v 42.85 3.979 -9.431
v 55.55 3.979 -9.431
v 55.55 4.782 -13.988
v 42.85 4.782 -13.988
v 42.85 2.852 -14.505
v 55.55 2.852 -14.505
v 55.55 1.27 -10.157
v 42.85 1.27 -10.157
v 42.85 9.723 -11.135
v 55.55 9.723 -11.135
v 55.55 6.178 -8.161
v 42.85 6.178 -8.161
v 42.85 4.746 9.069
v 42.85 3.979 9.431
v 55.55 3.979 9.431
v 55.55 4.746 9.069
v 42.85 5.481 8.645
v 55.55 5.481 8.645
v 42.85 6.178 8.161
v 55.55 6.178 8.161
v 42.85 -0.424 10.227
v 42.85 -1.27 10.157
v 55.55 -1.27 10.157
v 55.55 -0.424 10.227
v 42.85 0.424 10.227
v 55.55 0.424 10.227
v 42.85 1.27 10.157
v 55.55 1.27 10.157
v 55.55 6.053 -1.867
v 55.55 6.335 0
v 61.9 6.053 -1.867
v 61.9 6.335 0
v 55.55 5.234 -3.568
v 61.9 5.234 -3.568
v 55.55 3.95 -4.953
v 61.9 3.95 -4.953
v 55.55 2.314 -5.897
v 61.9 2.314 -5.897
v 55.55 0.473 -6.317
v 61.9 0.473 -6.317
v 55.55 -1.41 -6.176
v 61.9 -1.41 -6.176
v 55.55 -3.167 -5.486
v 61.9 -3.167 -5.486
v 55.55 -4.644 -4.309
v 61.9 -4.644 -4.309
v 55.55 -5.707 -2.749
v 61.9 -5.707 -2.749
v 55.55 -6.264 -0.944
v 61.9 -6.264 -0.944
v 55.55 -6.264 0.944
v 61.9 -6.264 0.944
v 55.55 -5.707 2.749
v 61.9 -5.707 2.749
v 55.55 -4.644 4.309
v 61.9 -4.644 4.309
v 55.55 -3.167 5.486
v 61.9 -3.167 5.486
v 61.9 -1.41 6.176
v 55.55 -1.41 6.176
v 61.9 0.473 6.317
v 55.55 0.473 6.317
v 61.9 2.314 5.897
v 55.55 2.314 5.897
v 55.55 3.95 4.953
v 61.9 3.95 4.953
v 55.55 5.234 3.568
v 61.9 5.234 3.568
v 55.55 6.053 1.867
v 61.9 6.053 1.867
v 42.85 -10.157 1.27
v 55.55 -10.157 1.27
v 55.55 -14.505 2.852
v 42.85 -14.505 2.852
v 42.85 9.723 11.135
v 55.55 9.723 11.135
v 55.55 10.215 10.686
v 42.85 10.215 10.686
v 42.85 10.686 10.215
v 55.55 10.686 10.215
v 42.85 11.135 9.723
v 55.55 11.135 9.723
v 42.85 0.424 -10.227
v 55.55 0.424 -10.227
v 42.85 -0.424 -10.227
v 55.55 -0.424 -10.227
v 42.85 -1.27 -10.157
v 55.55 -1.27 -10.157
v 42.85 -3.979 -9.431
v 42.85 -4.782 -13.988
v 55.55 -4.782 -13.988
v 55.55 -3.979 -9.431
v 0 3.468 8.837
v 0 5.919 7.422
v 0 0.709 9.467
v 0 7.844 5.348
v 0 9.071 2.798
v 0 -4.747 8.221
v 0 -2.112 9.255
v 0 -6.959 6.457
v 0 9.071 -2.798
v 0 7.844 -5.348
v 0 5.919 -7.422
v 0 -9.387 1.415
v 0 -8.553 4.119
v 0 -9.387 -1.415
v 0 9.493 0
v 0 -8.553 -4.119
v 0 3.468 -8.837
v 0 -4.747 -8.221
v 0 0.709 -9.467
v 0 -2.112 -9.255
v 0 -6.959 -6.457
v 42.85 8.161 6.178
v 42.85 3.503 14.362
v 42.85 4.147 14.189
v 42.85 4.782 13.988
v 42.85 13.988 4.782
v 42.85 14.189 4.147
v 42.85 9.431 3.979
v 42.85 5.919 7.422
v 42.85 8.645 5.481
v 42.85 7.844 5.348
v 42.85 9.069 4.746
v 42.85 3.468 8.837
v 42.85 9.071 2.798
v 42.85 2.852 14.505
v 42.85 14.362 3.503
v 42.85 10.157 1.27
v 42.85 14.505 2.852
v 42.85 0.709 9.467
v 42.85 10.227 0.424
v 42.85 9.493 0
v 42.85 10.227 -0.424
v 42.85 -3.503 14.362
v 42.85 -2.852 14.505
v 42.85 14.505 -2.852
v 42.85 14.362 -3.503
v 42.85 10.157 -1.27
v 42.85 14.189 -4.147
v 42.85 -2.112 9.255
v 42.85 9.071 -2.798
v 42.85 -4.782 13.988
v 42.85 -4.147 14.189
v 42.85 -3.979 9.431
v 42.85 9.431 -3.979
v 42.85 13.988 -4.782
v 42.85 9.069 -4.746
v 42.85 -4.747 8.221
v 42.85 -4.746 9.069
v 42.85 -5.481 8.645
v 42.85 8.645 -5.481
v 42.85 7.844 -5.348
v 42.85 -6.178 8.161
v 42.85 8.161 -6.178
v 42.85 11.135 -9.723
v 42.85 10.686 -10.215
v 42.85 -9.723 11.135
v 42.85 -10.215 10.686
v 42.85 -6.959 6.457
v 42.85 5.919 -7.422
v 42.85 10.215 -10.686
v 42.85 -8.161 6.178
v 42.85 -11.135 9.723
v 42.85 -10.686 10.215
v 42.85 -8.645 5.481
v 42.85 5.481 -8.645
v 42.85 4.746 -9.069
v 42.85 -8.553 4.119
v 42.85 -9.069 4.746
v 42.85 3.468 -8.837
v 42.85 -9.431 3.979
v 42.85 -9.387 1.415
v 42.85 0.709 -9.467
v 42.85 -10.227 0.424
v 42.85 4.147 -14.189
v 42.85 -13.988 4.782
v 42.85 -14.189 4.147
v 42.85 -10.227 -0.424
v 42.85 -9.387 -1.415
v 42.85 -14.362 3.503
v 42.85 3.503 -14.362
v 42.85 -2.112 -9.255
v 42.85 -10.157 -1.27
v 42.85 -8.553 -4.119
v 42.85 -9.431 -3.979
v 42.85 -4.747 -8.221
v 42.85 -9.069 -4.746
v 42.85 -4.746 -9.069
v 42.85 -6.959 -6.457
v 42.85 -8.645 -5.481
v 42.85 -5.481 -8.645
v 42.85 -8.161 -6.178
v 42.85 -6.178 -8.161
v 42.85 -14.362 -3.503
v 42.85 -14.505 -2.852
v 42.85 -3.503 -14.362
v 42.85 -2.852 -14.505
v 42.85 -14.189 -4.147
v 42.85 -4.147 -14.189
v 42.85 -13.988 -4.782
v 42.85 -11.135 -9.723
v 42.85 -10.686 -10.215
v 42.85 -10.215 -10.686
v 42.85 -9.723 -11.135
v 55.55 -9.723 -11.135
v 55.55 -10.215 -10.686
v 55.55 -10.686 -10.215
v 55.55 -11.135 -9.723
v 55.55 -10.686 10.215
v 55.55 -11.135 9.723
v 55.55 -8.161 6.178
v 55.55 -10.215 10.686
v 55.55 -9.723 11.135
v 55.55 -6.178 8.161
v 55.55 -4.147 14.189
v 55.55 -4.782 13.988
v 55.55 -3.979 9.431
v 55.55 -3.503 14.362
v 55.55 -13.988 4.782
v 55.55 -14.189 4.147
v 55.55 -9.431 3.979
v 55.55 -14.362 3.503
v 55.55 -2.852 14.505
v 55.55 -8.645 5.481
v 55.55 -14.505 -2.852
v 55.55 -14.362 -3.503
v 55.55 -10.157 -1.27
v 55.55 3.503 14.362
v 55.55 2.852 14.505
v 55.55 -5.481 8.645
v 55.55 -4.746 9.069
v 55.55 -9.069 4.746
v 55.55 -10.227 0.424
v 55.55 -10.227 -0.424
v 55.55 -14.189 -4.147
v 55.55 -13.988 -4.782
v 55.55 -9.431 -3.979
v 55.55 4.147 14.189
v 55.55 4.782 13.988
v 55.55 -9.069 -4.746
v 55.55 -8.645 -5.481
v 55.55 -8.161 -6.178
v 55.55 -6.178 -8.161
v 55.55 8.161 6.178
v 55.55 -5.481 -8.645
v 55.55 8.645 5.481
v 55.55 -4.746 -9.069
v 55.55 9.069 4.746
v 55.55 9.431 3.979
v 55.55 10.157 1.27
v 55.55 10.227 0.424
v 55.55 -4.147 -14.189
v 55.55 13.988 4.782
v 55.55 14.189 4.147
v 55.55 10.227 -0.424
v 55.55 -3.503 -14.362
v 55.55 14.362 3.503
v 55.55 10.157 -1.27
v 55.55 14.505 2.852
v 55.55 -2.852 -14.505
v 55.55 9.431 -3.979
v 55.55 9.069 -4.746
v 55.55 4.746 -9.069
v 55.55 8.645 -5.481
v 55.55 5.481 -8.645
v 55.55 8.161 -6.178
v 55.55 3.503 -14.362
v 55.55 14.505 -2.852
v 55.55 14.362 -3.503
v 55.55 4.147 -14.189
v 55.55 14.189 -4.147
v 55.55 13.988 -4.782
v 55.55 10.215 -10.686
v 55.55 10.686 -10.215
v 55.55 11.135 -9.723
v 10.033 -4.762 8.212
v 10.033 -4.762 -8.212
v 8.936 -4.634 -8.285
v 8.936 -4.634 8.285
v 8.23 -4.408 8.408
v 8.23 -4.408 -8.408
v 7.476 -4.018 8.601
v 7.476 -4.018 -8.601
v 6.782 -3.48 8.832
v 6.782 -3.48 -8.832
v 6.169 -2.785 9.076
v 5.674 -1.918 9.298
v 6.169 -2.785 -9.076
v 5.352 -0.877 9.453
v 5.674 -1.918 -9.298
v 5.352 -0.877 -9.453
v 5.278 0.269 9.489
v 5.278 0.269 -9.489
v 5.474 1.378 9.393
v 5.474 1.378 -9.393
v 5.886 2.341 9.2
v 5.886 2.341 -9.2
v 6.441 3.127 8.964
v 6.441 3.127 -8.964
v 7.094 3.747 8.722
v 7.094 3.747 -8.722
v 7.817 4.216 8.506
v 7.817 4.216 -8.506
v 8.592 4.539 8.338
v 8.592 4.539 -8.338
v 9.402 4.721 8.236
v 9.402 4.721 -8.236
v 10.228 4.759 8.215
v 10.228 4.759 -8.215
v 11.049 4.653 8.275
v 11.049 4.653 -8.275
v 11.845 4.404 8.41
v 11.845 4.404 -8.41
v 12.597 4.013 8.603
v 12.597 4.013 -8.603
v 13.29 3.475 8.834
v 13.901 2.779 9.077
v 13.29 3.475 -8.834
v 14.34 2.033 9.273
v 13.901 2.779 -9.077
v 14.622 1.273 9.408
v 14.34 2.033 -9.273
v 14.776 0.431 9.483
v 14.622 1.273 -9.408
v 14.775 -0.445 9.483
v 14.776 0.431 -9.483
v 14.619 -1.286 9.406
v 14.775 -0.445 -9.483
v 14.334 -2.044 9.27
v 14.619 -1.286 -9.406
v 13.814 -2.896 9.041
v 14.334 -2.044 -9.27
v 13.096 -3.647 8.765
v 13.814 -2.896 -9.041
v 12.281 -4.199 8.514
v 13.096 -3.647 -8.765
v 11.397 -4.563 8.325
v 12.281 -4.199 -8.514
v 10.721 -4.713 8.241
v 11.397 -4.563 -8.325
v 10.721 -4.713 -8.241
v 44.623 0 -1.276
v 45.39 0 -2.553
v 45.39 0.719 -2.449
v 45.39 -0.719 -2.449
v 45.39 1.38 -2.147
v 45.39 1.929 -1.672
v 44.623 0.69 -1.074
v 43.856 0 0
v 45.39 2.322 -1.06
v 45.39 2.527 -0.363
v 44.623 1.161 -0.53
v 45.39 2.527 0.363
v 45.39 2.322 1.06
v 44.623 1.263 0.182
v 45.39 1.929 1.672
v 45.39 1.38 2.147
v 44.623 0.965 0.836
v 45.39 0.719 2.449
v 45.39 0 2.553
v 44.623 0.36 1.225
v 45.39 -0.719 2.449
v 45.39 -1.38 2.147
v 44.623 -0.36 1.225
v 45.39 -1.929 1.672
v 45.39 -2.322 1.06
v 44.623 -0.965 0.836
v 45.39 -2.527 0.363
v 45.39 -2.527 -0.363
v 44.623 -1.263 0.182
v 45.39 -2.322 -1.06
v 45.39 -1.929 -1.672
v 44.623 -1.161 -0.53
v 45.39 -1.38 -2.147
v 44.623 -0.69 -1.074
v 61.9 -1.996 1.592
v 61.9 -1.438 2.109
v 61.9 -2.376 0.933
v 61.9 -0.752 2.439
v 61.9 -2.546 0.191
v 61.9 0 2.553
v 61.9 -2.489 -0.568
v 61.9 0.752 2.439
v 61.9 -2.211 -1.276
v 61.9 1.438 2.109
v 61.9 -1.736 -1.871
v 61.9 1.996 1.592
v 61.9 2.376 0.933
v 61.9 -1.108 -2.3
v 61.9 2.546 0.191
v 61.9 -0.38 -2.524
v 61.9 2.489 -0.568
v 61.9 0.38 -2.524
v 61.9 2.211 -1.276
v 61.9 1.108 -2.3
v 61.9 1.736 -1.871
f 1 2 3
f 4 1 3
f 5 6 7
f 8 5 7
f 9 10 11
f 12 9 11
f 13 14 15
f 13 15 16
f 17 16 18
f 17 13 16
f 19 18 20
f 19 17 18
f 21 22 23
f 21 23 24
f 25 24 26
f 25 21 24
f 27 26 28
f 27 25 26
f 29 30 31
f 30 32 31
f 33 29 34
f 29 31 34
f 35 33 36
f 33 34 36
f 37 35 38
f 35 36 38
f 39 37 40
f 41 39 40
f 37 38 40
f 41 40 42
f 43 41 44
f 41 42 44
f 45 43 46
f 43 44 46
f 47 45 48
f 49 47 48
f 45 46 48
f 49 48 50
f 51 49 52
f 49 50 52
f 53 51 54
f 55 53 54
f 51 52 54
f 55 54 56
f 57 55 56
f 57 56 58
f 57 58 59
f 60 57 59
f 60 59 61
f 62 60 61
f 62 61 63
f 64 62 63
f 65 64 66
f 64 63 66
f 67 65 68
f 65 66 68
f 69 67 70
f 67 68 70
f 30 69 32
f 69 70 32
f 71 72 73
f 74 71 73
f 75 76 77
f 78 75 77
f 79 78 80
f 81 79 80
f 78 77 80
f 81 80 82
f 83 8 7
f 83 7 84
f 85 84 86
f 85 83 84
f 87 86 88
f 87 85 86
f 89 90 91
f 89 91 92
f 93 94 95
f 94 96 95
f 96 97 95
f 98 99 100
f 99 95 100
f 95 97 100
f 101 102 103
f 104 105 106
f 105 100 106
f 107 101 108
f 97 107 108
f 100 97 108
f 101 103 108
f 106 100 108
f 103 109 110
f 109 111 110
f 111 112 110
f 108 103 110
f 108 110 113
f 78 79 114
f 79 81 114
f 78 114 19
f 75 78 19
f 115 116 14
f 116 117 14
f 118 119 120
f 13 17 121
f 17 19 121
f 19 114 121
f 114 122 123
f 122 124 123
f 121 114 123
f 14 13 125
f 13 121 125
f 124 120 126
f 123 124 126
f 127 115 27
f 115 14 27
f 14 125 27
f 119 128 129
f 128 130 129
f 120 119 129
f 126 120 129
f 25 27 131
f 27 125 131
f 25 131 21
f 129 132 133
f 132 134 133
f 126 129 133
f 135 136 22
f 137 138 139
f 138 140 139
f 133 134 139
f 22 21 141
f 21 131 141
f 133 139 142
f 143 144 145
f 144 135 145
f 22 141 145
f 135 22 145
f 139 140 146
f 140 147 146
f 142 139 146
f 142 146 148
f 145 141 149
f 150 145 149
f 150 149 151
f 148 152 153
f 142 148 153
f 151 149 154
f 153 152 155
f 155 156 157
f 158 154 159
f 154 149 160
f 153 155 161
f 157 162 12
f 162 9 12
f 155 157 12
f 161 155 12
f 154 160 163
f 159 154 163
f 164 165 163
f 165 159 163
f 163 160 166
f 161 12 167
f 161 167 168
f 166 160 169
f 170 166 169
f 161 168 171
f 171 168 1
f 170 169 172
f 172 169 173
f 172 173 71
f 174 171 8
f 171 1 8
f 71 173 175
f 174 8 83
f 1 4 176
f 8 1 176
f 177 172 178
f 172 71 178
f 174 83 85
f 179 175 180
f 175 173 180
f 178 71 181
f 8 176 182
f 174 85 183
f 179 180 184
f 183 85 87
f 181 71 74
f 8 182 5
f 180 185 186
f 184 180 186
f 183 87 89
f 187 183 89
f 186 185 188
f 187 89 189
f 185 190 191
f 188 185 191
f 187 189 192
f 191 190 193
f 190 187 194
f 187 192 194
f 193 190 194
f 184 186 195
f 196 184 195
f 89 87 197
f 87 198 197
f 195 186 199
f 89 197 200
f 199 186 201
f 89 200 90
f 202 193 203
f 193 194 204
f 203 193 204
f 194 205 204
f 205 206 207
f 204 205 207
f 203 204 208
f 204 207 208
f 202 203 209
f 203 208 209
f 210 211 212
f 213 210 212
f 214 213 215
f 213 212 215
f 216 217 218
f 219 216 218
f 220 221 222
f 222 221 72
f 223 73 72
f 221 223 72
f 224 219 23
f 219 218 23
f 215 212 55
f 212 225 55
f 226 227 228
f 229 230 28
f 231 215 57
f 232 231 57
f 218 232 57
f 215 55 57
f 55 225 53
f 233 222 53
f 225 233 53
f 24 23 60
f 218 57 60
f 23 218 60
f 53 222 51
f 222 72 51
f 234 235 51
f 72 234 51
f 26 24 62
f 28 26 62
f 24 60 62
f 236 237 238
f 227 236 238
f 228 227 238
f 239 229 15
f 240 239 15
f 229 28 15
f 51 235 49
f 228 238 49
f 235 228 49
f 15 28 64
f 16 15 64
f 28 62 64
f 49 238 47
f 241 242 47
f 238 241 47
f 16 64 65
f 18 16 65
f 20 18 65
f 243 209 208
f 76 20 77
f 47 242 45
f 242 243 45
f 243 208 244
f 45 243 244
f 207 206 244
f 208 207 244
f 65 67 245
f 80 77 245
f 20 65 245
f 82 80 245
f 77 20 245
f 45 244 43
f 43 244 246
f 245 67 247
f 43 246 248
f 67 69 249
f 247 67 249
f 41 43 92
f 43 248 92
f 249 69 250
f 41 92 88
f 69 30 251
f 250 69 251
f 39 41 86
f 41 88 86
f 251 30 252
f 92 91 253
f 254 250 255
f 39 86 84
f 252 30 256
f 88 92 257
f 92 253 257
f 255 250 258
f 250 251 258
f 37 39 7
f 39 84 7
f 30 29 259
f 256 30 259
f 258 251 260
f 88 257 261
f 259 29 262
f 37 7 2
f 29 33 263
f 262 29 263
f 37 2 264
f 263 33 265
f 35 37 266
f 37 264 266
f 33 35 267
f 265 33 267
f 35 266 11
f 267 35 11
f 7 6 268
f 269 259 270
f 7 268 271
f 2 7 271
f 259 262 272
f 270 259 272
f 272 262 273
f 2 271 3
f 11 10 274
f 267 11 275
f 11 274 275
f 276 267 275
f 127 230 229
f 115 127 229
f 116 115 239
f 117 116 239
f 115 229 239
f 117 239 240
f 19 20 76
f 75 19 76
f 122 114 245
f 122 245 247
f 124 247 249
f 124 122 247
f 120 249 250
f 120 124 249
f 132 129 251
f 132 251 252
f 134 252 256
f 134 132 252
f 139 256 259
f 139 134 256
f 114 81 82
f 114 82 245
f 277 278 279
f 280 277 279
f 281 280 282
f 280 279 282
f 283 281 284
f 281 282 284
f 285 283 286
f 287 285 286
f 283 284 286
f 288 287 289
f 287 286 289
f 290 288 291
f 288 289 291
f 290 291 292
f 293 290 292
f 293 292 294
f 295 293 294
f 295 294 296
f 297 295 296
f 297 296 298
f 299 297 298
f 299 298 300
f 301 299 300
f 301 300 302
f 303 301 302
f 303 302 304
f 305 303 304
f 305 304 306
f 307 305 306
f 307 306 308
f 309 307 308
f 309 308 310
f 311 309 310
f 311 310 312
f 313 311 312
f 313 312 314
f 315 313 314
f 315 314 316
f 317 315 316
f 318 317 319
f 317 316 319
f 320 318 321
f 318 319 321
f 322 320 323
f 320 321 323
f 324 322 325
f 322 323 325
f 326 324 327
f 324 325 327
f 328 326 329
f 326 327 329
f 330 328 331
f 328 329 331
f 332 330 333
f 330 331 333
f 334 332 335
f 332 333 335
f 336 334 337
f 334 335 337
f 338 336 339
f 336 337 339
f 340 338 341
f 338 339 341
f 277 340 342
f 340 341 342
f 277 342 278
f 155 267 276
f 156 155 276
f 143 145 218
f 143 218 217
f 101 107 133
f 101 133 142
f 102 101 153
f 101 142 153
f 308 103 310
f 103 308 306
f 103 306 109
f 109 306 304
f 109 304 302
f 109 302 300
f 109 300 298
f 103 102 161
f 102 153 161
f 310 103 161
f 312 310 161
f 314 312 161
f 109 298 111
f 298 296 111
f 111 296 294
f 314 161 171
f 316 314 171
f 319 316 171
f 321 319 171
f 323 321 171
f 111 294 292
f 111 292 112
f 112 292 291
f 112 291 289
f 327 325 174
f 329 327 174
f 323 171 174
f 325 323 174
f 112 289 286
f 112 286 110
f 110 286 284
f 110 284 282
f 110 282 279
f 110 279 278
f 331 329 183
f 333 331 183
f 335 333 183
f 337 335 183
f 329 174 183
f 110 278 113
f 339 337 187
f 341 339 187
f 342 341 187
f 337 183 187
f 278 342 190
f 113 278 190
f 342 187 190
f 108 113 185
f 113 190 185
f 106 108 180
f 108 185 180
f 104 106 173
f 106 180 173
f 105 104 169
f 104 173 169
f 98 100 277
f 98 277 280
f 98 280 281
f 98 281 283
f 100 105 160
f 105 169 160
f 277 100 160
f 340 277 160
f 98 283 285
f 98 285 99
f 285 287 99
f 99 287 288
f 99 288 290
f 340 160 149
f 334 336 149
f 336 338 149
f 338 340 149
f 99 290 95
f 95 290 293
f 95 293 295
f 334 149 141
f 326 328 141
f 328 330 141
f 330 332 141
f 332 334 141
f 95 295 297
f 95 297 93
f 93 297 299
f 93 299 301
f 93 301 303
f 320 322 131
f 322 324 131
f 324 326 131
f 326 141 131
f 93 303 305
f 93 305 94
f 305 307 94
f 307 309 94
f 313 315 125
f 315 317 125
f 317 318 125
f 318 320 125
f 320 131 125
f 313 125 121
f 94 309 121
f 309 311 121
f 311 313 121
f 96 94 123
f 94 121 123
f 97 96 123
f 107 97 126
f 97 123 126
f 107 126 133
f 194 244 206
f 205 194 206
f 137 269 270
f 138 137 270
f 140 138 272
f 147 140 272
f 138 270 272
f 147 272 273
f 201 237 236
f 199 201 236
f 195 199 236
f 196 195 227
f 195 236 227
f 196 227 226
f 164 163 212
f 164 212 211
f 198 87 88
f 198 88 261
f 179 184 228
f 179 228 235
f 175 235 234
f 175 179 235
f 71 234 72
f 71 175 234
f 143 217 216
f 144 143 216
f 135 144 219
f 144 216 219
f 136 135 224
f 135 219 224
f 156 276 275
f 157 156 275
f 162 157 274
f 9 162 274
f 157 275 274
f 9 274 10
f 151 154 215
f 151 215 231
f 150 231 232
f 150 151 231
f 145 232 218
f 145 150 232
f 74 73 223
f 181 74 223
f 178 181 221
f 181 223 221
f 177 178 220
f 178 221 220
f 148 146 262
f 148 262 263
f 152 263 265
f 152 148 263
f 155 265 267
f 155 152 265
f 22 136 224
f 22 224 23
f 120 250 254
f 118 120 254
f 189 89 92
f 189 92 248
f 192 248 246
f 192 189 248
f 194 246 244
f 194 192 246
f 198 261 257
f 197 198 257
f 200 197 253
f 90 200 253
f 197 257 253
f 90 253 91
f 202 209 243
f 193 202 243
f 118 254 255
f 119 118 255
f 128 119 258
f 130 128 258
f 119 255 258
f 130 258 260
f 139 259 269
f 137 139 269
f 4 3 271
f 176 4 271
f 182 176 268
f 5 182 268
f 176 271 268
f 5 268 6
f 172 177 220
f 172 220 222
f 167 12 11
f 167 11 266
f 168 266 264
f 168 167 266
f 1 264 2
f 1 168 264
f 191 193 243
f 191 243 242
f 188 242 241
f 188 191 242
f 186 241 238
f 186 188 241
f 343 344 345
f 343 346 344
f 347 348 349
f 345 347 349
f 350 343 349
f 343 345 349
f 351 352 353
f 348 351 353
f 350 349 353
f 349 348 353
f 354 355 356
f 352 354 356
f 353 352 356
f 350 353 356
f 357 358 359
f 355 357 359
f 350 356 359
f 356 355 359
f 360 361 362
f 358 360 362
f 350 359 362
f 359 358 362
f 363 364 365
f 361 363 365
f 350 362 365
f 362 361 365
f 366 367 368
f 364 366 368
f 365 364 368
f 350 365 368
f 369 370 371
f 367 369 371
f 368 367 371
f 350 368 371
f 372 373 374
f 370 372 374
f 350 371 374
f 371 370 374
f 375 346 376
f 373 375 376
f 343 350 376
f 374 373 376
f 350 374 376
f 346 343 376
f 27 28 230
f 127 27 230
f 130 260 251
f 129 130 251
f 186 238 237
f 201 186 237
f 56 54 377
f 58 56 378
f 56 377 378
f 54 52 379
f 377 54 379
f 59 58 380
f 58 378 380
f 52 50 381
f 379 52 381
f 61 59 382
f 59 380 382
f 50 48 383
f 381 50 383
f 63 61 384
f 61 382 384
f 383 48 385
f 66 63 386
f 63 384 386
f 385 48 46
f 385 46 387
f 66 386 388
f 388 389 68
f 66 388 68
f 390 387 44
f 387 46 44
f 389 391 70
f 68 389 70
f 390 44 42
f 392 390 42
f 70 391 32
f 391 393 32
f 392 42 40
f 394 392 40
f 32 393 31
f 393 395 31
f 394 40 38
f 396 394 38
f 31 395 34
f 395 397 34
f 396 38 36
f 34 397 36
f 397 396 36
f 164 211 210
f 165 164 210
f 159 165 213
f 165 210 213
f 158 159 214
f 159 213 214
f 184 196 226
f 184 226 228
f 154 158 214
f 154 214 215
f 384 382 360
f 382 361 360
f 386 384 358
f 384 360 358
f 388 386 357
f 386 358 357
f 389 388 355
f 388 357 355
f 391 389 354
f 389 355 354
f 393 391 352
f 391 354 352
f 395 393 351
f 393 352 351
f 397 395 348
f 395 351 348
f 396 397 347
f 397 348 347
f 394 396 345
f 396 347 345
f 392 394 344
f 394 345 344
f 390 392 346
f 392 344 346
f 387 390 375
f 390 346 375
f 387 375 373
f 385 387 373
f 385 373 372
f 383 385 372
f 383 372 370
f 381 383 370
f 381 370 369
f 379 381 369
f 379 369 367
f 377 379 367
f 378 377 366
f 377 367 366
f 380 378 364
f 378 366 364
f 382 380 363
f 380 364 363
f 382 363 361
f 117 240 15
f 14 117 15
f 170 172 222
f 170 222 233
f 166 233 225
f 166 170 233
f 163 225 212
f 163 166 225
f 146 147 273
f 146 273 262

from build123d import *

# Parameters (mm, degrees)
HOLE1_D                     = 9.525
F_1_4_20_TAPPED_HOLE1_D     = 5.1054
F_1_4_20_TAPPED_HOLE1_DEPTH = 16.51
F_1_4_20_TAPPED_HOLE1_TIP   = 1.533816902
CUT_EXTRUDE1_START          = -56.5498001
CUT_EXTRUDE1_DEPTH          = 63.8998001
CIRPATTERN1_COUNT           = 12


with BuildPart() as part:
    # Sketch1 → Revolve1 (revolve)
    with BuildSketch(Plane.XY):
        Polygon((0, 0), (0, 9.49325), (42.8498, 9.49325), (42.8498, 14.7828), (55.5498, 14.7828), (55.5498, 6.33476), (61.8998, 6.33476), (61.8998, 0), align=None)
    revolve(axis=Axis((0, 0, 0), (-1, 0, 0)))

    # Hole1 (through all)
    with Locations(Plane(origin=(10.033, 0, 9.49325), x_dir=(0, 1, 0), z_dir=(0, 0, 1))):
        with Locations((0, 0)):
            Hole(HOLE1_D / 2)

    # 1/4-20 Tapped Hole1
    with Locations(Plane(origin=(61.8998, 0, 0), x_dir=(0, 0, -1), z_dir=(1, 0, 0))):
        with Locations((0, 0)):
            Hole(F_1_4_20_TAPPED_HOLE1_D / 2, depth=F_1_4_20_TAPPED_HOLE1_DEPTH)
            with Locations((0, 0, -(F_1_4_20_TAPPED_HOLE1_DEPTH + F_1_4_20_TAPPED_HOLE1_TIP / 2))):  # 118° drill point
                Cone(0, F_1_4_20_TAPPED_HOLE1_D / 2, F_1_4_20_TAPPED_HOLE1_TIP, mode=Mode.SUBTRACT)

    # Sketch13 → Cut-Extrude1 (cut)
    with BuildSketch(Plane(origin=(55.5498, 0, 0), x_dir=(0, 0, -1), z_dir=(1, 0, 0)).offset(CUT_EXTRUDE1_START)):
        with BuildLine():
            Line((-2.852495169, 14.504980081), (-1.27, 10.157110339))
            ThreePointArc((-1.27, 10.157110339), (0, 10.2362), (1.27, 10.157110339))
            Line((1.27, 10.157110339), (2.852495169, 14.504980081))
            ThreePointArc((2.852495169, 14.504980081), (0, 14.7828), (-2.852495169, 14.504980081))
        make_face()
    cut_extrude1 = extrude(amount=CUT_EXTRUDE1_DEPTH, mode=Mode.SUBTRACT)

    # CirPattern1: Cut-Extrude1 ×12 about axis
    cirpattern1_axis = Axis((55.5498, 0, 0), (1, 0, 0))
    for i in range(1, CIRPATTERN1_COUNT):
        add(cut_extrude1.rotate(cirpattern1_axis, i * 360 / CIRPATTERN1_COUNT), mode=Mode.SUBTRACT)


solid = part.part
